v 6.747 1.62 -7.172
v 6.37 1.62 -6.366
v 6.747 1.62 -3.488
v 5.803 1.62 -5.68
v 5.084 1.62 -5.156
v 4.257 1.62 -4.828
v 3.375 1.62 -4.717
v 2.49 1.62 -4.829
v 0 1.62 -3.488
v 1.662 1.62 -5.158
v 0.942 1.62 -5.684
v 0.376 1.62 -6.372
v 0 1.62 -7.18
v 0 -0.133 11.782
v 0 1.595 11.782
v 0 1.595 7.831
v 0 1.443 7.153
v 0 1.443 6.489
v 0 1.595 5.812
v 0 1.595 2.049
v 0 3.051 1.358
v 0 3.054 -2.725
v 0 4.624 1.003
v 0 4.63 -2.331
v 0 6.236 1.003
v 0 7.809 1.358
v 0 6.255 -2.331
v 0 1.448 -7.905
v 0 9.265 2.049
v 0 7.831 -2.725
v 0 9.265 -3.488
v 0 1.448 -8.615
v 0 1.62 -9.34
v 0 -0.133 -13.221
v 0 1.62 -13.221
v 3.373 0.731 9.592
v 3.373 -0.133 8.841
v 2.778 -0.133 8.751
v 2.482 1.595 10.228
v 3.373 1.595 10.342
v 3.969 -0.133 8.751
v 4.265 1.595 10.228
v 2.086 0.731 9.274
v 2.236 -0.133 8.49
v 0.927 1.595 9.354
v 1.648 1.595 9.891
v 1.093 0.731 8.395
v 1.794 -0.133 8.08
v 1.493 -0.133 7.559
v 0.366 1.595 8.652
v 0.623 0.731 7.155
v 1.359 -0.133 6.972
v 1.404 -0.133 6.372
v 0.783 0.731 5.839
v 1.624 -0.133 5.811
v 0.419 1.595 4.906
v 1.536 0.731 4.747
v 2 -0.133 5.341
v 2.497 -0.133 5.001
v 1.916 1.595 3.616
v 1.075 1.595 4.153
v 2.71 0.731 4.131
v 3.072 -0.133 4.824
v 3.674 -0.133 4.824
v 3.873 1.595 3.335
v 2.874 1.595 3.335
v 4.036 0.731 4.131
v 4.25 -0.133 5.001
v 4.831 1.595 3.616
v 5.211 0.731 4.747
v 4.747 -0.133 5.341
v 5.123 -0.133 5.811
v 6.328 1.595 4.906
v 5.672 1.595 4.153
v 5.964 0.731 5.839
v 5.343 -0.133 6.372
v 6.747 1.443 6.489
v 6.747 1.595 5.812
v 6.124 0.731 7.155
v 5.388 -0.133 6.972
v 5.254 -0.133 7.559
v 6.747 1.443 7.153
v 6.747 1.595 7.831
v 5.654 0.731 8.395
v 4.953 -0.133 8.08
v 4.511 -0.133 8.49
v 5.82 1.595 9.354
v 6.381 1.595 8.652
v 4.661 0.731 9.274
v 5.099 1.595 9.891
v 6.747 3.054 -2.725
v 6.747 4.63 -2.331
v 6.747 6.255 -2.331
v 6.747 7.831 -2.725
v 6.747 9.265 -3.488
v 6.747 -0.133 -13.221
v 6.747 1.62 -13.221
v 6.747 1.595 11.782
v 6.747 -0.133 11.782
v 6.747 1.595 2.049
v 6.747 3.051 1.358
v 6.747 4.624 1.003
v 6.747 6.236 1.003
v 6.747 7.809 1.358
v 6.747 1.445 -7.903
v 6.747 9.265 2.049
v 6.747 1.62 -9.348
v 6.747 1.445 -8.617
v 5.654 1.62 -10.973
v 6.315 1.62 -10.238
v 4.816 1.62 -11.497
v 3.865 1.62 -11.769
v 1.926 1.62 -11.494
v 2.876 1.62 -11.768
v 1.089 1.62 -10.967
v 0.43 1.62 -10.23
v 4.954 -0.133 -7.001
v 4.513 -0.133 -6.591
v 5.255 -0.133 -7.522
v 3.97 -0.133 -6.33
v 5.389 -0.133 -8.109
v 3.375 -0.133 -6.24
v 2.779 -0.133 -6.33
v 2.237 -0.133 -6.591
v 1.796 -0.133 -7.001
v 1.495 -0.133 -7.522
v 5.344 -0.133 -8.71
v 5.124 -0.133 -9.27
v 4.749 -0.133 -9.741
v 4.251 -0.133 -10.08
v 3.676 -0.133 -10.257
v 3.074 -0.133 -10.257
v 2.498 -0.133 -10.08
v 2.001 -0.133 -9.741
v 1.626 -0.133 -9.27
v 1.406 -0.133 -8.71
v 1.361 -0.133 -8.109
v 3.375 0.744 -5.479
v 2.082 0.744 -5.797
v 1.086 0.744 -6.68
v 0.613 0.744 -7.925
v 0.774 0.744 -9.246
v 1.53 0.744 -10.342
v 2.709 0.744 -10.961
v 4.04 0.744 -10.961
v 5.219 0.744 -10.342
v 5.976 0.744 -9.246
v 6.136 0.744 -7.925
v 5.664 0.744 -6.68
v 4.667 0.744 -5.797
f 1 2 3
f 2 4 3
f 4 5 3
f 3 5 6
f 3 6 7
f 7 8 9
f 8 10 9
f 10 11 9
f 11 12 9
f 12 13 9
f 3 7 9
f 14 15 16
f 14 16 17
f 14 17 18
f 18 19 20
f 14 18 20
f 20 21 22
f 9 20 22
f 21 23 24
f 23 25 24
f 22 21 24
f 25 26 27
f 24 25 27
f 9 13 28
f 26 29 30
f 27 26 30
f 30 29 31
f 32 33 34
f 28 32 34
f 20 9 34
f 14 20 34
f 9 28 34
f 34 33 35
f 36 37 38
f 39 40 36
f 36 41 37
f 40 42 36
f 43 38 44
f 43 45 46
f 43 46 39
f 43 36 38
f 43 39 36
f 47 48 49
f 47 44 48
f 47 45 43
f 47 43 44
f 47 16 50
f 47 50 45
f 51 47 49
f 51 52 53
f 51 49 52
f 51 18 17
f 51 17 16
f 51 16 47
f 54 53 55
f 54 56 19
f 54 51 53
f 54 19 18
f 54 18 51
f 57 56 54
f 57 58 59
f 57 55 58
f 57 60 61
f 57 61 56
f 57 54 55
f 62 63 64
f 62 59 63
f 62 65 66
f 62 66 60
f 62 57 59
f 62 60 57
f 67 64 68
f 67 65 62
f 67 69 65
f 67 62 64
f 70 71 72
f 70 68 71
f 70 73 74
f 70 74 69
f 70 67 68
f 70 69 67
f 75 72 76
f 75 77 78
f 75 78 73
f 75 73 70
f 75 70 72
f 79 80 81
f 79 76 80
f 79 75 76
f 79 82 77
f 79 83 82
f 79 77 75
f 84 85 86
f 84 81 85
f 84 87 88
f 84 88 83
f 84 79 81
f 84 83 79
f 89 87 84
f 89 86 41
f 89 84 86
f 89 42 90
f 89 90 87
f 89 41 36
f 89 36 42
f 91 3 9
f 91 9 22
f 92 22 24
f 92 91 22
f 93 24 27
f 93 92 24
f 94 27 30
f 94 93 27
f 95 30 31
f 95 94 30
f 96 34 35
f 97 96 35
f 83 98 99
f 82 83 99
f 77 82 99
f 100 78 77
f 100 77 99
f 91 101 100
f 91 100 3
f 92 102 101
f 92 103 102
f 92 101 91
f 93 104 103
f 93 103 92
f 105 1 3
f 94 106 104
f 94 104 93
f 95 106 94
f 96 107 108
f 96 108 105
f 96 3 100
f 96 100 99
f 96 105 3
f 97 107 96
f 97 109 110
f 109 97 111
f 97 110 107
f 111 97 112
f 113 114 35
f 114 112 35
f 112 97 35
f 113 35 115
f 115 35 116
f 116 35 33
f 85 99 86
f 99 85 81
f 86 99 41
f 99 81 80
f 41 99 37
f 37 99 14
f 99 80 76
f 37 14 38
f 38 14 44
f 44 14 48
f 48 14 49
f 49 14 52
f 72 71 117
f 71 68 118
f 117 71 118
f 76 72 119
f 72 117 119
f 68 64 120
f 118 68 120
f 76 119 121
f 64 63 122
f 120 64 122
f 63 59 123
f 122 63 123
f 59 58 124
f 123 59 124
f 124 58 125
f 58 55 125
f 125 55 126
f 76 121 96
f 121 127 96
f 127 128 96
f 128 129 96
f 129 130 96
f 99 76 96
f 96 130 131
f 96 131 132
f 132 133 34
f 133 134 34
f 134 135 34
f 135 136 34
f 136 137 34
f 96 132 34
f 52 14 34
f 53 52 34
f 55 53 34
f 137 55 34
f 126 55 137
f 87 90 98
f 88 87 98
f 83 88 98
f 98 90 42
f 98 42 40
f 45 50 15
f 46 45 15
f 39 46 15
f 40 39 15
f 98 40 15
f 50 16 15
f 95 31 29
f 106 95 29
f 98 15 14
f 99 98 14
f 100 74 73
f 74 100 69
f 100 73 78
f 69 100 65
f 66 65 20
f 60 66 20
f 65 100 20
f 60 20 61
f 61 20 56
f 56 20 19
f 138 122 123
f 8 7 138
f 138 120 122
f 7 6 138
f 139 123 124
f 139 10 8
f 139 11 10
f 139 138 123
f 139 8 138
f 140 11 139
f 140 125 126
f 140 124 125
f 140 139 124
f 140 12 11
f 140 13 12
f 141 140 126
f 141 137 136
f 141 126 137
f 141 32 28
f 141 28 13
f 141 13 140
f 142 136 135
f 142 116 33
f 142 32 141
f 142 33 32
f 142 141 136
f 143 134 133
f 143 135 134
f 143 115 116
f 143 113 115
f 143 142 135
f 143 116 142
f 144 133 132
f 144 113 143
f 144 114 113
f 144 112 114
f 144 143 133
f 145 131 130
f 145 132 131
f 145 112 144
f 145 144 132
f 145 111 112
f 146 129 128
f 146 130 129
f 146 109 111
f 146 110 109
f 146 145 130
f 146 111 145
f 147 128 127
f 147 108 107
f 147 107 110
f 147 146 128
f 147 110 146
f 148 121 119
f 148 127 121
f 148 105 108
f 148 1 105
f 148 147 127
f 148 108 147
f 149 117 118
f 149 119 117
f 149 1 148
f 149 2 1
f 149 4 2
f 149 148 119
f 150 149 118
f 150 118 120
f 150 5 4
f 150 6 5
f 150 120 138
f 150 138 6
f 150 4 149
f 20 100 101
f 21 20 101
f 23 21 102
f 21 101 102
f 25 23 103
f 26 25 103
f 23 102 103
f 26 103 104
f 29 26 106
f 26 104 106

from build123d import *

# Parameters (mm, degrees)
BOSS_EXTRUDE2_DEPTH                           = 6.746875
CUT_EXTRUDE1_REACH                            = 8.747
CSK_FOR_6_FLAT_HEAD_MACHINE_SCREW1_AT_2_COUNT = 2
CSK_FOR_6_FLAT_HEAD_MACHINE_SCREW1_AT_2_PITCH = 15.08125


with BuildPart() as part:
    # Sketch2 → Boss-Extrude2 (new body)
    with BuildSketch(Plane(origin=(0, 0, 0), x_dir=(0, 0, -1), z_dir=(1, 0, 0))):
        Polygon((-2.049136217, 1.594614568), (-11.782098717, 1.594614568), (-11.782098717, -0.132585432), (13.221026283, -0.132585432), (13.221026283, 1.620014568), (3.488063783, 1.620014568), (3.488063783, 9.265414568), (-2.049136217, 9.265414568), align=None)
    extrude(amount=BOSS_EXTRUDE2_DEPTH)

    # Sketch9 → Cut-Extrude1 (cut, up to next)
    with BuildSketch(Plane(origin=(6.746875, 0, 0), x_dir=(0, 0, -1), z_dir=(1, 0, 0)), mode=Mode.PRIVATE) as cut_extrude1_sk1:
        with BuildLine():
            Line((-2.049136217, 9.265414568), (-2.049136217, 1.594614568))
            ThreePointArc((-2.049136217, 1.594614568), (-0.958515707, 5.430014568), (-2.049136217, 9.265414568))
        make_face()
    cut_extrude1_tool1 = extrude(cut_extrude1_sk1.sketch, amount=-CUT_EXTRUDE1_REACH, mode=Mode.PRIVATE) & part.part
    add(cut_extrude1_tool1.solids().sort_by_distance((6.746875, 5.430015, 1.609964))[0], mode=Mode.SUBTRACT)
    # Sketch9 → Cut-Extrude1 (cut, up to next)
    with BuildSketch(Plane(origin=(6.746875, 0, 0), x_dir=(0, 0, -1), z_dir=(1, 0, 0)), mode=Mode.PRIVATE) as cut_extrude1_sk2:
        with BuildLine():
            Line((3.488063783, 9.265414568), (3.488063783, 1.620014568))
            ThreePointArc((3.488063783, 1.620014568), (2.281768381, 5.442714568), (3.488063783, 9.265414568))
        make_face()
    cut_extrude1_tool2 = extrude(cut_extrude1_sk2.sketch, amount=-CUT_EXTRUDE1_REACH, mode=Mode.PRIVATE) & part.part
    add(cut_extrude1_tool2.solids().sort_by_distance((6.746875, 5.442715, -3.001592))[0], mode=Mode.SUBTRACT)

    # Sketch7 → CSK for #6 Flat Head Machine Screw1 (revolve, cut)
    with BuildSketch(Plane(origin=(3.374760147, 1.620014568, -8.260088783), x_dir=(0, 0, 1), z_dir=(1, 0, 0))):
        Polygon((0, 0), (0, 1.7526), (1.89865, 1.7526), (1.89865, 1.891953401), (3.5433, 0), align=None)
    csk_for_6_flat_head_machine_screw1 = revolve(axis=Axis((3.374760147, 7.970014568, -8.260088783), (0, -1, 0)), mode=Mode.SUBTRACT)

    # CSK for #6 Flat Head Machine Screw1 at 2: CSK for #6 Flat Head Machine Screw1 ×2
    with Locations(*[Vector(-8.7701e-05, 0, 0.999999996) * (i * CSK_FOR_6_FLAT_HEAD_MACHINE_SCREW1_AT_2_PITCH) for i in range(1, CSK_FOR_6_FLAT_HEAD_MACHINE_SCREW1_AT_2_COUNT)]):
        add(csk_for_6_flat_head_machine_screw1, mode=Mode.SUBTRACT)


solid = part.part
